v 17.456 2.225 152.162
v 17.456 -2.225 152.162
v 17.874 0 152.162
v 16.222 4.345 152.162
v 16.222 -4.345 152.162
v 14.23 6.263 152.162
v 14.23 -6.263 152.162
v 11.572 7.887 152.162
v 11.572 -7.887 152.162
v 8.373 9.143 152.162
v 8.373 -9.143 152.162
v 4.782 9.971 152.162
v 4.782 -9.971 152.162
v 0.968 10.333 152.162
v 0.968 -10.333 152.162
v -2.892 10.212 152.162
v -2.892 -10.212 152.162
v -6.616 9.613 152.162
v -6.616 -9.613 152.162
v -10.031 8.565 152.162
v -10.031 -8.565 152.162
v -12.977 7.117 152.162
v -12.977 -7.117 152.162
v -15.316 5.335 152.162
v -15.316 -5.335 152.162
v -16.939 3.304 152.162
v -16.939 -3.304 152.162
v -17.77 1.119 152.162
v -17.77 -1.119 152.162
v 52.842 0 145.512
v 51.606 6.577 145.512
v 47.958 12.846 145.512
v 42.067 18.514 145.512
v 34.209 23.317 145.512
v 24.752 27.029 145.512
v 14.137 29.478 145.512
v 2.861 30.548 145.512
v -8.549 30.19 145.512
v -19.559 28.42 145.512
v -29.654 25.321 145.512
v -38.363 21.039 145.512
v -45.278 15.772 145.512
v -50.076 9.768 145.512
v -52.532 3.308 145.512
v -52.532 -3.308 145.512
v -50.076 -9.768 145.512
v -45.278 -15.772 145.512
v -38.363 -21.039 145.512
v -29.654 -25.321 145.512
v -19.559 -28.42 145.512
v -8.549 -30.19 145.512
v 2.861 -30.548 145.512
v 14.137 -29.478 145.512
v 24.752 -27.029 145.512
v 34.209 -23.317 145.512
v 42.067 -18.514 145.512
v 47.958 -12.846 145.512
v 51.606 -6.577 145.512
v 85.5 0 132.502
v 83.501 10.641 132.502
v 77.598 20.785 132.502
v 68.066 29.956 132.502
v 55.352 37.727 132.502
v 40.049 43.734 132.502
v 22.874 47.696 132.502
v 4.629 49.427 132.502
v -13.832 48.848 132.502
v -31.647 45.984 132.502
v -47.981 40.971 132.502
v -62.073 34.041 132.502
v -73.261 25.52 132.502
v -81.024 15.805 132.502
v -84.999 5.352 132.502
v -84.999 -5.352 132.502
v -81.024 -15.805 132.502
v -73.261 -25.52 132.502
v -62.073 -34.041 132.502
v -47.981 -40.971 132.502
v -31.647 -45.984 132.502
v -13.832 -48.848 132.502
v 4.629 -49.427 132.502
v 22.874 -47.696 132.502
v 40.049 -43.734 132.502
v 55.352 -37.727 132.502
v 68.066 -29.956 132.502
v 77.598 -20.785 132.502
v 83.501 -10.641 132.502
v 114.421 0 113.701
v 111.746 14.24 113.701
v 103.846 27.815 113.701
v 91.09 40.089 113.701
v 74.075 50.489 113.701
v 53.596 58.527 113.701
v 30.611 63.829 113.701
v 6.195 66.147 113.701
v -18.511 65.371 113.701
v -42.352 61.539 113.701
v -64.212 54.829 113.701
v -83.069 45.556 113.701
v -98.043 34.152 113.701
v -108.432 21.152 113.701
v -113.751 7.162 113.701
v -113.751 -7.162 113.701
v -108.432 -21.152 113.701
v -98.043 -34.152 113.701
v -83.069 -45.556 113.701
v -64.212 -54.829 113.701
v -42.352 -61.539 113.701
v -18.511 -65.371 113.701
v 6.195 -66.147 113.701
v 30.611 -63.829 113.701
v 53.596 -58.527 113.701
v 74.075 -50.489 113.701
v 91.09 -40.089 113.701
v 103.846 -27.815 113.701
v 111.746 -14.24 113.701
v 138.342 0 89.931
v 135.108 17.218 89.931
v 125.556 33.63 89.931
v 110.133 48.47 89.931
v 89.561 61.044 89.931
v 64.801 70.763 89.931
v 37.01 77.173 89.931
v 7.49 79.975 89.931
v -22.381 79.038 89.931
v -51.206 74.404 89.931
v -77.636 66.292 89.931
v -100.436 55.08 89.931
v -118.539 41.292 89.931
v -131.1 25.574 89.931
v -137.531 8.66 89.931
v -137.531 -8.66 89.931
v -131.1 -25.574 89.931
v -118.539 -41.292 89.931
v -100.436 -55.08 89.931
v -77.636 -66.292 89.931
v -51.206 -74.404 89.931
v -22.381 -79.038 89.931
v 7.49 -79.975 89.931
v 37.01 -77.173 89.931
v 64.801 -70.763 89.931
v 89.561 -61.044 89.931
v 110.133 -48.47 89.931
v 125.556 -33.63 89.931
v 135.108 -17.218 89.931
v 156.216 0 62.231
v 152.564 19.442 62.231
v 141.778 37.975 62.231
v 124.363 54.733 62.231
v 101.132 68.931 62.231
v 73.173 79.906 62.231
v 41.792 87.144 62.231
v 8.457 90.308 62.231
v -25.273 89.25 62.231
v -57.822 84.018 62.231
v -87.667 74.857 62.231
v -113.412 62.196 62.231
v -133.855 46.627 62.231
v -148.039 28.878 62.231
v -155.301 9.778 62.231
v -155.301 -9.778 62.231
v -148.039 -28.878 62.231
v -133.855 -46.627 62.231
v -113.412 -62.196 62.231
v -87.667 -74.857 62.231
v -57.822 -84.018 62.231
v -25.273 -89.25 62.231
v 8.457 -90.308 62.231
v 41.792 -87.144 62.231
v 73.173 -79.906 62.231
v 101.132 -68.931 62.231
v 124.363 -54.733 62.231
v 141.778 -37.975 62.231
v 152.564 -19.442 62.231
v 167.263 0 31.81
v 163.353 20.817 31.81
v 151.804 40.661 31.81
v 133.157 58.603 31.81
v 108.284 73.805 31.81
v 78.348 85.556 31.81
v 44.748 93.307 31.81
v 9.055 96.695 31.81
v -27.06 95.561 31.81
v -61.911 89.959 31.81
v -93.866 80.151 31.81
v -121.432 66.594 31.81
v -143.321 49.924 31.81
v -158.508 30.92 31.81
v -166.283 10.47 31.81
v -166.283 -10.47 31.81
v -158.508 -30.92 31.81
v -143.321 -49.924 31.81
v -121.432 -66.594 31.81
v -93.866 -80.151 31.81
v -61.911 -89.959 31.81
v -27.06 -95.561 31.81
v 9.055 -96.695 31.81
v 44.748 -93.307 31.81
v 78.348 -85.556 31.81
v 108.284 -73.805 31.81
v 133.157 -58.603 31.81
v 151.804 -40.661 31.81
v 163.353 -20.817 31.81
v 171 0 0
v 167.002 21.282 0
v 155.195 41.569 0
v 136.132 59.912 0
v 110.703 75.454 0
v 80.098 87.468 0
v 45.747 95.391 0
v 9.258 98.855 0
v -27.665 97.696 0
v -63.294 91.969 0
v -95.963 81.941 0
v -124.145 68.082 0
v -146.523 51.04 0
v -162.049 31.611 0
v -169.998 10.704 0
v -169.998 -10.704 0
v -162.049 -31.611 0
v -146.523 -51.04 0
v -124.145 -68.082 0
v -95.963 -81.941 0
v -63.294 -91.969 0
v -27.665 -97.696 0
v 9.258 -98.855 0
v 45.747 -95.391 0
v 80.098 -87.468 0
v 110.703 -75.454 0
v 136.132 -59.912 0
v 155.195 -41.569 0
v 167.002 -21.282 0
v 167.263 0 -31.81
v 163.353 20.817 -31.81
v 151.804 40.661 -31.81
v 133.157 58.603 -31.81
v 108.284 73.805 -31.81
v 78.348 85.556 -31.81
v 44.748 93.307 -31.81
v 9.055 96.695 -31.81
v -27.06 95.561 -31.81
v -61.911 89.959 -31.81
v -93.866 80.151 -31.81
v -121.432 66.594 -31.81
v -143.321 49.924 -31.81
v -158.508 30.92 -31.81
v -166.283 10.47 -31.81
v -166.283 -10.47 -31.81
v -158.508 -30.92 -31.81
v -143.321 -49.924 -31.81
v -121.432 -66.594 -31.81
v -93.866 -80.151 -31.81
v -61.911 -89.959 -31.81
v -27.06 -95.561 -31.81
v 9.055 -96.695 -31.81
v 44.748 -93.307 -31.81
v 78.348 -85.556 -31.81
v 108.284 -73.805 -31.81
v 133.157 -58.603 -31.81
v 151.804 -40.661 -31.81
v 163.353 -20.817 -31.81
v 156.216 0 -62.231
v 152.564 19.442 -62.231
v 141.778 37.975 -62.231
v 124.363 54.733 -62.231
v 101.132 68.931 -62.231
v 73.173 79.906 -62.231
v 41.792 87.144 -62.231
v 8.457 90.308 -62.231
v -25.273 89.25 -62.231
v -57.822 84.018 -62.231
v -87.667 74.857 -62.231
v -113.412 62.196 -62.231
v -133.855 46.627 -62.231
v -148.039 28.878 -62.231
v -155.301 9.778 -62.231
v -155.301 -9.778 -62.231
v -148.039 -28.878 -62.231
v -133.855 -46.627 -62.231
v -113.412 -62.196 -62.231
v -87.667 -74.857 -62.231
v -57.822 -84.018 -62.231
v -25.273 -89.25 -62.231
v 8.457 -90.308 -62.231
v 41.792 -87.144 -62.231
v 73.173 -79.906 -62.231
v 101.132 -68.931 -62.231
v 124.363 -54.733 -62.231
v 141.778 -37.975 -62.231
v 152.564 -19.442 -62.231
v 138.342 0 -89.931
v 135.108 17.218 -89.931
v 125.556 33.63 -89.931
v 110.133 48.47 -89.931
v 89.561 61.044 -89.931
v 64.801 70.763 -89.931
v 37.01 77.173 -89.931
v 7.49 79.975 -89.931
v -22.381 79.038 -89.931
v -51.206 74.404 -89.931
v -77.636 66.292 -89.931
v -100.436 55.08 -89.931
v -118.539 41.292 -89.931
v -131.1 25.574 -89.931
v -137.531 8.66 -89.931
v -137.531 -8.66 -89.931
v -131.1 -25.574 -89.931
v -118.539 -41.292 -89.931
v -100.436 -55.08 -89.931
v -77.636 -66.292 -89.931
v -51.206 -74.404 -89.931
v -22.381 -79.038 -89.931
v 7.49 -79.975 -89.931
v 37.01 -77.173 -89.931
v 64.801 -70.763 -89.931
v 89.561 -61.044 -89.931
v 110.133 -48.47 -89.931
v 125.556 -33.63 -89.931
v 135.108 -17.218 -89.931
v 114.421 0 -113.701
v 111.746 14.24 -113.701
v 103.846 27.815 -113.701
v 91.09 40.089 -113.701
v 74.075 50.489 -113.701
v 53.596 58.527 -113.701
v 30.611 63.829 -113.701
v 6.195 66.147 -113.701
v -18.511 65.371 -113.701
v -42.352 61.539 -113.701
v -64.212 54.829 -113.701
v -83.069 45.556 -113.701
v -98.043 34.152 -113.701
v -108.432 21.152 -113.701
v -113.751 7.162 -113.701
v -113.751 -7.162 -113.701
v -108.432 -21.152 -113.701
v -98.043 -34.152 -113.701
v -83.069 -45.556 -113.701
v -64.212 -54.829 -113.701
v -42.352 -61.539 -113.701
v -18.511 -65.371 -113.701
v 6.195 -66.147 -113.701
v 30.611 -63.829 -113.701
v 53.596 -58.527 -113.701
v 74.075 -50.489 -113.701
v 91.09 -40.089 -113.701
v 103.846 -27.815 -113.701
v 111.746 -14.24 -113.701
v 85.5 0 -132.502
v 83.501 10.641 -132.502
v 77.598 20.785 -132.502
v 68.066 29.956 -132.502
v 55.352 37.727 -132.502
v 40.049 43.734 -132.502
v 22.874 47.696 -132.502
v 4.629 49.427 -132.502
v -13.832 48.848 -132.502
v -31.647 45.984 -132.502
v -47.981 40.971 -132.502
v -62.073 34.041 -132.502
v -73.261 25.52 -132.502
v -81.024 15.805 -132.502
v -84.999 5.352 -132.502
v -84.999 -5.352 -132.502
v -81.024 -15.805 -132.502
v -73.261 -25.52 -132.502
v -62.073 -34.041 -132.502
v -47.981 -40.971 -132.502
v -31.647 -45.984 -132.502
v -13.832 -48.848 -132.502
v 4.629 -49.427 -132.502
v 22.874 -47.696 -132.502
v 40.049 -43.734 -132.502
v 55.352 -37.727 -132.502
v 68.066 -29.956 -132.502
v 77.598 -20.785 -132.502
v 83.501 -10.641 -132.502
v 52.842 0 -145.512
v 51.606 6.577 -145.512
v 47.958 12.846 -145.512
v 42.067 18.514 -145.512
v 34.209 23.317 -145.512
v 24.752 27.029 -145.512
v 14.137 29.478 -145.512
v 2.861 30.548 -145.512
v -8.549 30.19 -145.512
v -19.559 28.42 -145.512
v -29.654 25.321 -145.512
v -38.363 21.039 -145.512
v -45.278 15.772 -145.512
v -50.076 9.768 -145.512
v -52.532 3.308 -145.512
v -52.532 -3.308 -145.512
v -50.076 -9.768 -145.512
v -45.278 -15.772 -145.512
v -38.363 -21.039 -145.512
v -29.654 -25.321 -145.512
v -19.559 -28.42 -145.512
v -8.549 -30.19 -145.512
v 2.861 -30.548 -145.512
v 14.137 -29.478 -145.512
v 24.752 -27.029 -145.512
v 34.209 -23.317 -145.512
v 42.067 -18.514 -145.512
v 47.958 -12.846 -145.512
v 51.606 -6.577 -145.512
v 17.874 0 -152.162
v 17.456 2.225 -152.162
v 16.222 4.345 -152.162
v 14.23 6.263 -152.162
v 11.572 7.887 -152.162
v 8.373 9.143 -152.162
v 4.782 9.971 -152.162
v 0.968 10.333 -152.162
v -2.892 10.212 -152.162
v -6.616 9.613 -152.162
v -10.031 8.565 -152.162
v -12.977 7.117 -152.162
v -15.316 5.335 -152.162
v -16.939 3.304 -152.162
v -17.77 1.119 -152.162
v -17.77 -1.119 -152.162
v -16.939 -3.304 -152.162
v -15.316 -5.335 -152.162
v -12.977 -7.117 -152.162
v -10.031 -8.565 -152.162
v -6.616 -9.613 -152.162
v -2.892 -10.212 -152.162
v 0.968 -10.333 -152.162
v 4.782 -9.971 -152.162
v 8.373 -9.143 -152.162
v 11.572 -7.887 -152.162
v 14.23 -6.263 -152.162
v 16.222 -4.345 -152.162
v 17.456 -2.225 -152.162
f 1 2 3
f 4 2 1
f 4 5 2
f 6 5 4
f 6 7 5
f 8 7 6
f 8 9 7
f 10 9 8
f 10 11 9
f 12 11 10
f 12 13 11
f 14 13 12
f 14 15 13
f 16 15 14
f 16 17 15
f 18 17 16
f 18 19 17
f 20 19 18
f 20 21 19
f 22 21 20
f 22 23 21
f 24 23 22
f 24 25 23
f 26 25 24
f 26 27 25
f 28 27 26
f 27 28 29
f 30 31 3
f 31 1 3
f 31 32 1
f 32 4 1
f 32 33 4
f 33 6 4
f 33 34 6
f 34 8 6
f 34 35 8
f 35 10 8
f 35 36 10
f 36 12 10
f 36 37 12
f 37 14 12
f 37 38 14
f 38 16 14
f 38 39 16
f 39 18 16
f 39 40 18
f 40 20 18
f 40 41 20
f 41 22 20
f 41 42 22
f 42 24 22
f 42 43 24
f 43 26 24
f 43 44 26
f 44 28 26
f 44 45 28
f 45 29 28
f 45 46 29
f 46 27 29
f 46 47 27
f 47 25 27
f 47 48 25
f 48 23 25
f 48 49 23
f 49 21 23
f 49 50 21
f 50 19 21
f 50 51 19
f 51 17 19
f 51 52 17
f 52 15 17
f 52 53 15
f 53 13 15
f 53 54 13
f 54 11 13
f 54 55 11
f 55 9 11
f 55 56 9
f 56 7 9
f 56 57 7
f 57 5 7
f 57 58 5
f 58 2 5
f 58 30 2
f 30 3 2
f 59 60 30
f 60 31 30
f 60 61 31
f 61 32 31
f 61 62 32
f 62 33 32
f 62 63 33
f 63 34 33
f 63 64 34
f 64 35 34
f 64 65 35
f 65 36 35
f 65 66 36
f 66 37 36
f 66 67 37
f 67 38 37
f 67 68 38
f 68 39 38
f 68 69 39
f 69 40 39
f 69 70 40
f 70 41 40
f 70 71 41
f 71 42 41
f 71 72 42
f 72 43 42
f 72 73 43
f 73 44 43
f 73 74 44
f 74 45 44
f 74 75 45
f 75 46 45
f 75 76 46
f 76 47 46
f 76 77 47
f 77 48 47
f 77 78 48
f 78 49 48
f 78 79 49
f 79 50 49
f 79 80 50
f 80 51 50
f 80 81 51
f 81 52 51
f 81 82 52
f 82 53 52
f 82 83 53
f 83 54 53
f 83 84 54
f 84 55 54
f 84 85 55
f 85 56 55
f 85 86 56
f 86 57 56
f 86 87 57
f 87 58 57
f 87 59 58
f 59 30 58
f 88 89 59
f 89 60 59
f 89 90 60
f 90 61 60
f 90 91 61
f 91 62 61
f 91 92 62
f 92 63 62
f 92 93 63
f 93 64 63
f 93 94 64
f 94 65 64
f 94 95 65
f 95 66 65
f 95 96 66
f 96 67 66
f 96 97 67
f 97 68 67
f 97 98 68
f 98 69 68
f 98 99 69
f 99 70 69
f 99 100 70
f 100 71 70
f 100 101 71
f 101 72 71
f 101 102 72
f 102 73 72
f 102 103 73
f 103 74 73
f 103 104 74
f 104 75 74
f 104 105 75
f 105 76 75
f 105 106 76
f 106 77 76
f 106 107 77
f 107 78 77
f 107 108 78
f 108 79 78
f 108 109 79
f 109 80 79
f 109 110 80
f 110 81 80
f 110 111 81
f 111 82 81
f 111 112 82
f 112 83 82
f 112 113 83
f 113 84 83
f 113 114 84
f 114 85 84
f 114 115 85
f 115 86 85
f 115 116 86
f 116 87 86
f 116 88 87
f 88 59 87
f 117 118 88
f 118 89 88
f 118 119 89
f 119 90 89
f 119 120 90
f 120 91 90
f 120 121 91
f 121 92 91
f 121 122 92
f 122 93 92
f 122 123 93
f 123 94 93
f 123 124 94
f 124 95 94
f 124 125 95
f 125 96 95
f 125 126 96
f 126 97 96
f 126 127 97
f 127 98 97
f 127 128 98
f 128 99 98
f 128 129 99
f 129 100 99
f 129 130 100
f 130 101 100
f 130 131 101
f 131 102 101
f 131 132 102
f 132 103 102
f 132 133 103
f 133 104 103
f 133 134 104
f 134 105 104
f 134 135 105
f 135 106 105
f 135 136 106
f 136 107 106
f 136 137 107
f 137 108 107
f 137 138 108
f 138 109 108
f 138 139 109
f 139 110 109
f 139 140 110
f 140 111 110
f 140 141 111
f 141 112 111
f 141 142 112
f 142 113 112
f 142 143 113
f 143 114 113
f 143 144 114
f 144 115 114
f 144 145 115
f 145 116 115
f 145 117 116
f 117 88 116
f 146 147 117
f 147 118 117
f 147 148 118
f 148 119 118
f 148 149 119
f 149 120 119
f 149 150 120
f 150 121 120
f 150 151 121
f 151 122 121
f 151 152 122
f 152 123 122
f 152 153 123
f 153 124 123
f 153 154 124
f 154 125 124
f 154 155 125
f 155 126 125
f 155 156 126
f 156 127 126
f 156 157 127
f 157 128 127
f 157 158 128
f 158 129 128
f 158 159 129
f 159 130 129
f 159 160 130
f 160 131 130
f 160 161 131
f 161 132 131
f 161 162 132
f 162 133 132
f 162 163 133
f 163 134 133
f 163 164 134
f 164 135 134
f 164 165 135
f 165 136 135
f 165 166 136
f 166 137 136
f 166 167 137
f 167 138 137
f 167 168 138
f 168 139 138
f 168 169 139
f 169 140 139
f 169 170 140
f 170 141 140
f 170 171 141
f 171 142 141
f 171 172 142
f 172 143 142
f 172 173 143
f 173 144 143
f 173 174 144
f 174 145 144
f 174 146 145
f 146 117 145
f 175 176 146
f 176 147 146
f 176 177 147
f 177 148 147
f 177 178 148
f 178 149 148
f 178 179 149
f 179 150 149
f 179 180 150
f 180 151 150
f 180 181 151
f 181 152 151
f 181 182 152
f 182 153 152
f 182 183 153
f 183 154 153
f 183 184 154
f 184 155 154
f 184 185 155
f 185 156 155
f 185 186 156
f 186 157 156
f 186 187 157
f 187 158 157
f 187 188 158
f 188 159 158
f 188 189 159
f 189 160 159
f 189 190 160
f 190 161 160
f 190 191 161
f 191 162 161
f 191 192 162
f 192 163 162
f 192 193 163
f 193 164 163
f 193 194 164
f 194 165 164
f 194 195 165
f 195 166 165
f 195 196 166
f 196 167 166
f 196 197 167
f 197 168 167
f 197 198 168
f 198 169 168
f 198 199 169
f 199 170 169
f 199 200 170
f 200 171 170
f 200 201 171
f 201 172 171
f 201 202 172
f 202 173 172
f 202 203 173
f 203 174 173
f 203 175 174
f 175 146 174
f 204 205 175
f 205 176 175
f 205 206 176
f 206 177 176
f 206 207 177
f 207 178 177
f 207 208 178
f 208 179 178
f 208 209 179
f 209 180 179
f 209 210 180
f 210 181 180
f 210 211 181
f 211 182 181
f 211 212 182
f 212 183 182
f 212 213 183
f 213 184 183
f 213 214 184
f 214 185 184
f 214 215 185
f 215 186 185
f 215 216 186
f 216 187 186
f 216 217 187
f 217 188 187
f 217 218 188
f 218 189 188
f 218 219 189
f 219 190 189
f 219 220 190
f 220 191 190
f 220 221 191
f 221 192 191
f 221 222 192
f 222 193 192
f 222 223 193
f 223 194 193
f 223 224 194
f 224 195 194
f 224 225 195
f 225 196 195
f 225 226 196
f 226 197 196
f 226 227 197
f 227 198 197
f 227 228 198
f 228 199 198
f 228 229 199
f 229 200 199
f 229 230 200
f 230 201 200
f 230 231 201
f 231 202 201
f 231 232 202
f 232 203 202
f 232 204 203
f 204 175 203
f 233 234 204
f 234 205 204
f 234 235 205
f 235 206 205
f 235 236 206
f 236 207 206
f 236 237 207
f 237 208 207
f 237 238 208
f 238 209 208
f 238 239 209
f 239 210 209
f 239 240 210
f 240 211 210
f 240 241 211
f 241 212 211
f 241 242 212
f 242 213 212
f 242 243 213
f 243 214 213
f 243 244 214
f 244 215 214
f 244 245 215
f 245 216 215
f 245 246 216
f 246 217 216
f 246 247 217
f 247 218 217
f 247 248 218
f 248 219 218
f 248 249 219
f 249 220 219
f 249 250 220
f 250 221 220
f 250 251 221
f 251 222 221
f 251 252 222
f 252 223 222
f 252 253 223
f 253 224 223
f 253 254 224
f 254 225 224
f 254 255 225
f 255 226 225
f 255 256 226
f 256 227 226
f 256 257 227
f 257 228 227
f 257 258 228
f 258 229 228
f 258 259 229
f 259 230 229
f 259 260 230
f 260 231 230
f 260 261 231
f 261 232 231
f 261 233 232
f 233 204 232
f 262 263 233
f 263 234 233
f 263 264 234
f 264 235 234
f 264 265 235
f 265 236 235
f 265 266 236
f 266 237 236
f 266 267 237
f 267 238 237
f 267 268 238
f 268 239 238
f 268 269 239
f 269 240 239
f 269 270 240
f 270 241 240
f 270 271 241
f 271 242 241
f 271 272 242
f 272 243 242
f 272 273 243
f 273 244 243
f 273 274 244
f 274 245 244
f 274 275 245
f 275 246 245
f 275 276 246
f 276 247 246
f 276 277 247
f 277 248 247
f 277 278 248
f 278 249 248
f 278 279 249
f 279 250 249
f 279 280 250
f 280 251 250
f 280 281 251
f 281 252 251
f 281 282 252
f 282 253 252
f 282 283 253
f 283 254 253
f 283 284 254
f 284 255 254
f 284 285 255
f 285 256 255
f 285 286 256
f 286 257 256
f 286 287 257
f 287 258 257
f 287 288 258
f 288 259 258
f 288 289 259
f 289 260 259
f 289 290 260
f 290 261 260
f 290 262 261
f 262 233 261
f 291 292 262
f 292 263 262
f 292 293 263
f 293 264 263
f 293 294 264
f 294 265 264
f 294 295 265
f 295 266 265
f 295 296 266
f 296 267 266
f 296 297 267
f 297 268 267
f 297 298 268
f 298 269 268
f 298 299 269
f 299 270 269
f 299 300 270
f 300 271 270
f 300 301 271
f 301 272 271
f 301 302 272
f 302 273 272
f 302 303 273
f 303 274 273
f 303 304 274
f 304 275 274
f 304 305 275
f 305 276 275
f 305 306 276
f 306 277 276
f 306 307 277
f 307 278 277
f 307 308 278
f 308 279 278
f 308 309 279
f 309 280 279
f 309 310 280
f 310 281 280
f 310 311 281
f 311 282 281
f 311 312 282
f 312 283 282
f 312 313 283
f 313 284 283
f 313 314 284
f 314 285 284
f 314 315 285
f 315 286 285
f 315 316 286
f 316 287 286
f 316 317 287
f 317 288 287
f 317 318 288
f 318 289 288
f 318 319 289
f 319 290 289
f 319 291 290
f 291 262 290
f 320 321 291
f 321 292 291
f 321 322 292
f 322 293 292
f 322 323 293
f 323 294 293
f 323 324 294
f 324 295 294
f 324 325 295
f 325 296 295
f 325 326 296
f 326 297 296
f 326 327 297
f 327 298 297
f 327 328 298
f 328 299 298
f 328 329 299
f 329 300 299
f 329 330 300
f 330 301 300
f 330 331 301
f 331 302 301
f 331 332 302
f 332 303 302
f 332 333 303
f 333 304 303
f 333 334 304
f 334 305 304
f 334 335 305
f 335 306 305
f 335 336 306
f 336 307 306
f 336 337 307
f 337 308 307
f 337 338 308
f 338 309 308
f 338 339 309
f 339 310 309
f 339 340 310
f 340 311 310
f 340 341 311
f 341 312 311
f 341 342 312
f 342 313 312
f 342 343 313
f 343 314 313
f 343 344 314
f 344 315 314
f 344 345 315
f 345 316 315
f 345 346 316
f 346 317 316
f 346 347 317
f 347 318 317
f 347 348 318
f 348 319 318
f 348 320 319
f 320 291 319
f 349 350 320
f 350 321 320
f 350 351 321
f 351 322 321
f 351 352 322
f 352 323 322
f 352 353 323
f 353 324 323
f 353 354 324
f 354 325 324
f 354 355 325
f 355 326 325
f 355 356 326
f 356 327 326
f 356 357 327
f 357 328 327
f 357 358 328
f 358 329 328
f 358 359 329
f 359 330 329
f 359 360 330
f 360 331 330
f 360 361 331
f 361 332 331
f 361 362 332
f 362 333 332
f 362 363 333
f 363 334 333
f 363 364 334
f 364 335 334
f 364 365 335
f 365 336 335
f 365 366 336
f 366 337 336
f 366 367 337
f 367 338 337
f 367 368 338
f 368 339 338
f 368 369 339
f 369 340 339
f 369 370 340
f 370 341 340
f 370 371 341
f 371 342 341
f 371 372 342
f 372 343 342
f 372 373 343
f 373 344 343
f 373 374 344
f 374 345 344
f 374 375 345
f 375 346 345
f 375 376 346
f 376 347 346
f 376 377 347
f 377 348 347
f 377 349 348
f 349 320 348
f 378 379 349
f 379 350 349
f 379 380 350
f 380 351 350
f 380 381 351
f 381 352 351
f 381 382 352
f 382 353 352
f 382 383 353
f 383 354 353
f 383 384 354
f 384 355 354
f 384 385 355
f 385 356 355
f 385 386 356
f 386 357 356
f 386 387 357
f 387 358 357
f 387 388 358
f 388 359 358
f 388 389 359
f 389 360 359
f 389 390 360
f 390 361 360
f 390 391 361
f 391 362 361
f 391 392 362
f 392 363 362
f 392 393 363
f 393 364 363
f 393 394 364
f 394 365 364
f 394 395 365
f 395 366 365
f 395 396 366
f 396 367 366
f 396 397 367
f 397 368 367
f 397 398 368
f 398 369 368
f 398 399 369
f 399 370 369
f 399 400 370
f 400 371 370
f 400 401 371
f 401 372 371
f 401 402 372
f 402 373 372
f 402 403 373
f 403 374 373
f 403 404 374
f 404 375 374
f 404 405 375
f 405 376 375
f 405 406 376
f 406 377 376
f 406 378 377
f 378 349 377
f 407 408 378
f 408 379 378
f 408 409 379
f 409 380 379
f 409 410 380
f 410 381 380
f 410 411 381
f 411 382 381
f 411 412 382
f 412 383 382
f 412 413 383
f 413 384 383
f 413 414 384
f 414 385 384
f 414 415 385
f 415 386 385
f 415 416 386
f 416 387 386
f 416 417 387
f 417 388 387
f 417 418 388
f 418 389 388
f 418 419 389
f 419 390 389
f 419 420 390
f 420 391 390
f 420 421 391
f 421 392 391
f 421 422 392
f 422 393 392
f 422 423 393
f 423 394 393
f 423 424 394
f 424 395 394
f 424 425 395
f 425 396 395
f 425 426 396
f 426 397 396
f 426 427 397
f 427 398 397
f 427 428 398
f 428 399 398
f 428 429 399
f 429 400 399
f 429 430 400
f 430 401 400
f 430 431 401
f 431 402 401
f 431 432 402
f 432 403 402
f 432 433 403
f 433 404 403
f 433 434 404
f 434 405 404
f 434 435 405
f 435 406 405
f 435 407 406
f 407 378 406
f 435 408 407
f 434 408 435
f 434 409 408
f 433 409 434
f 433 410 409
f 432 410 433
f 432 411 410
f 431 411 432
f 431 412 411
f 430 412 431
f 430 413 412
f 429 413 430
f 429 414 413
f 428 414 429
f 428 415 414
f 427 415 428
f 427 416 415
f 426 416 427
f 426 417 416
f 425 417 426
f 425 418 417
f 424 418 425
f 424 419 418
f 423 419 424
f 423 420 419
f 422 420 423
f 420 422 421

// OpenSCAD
// Generated by SolidPython 1.0.1 on 2020-07-29 00:46:54


scale(v = [19, 11, 17]) {
	sphere(r = 9);
}
/***********************************************
*********      SolidPython code:      **********
************************************************
 
# import packages: SolidPython
from solid import *
from solid.utils import *
from itertools import chain, combinations, permutations


class Resize:

    def __init__(self, scad_file):
        self.scad_file = scad_file
        #self.scad_file = import_scad(scad_file)
        # cone/cylinder param:
        self.r1 = 0
        self.r2 = 0
        self.h = 0
        # rectangular prism param:
        self.w = 0
        self.l = 0
        # ellipse param:
        self.r = 0

    # import OpenScad code (file name corresponds to shape)


    # classify shape + parameters
    def assign(self, param1, param2, param3):
        if self.scad_file == 'cone.scad':
            self.r1 = param1
            self.r2 = param2
            self.h = param3
        elif self.scad_file == 'cylinder.scad':
            self.r1 = param1
            self.r2 = param2
            self.h = param3
        elif self.scad_file == 'rectangularPrism.scad':
            self.h = param1
            self.l = param2
            self.w = param3
        else:
            self.r = param1
            self.h = param2

    # resize parameters
    def iterate(self):
        x = range(3, 20, 2)
        i = 1
        if self.scad_file == 'cone.scad':
            tempList = list(permutations(x, 2))
            for temp in tempList:
                param1 = temp[0]
                param2 = temp[1]
                filepath = 'produced_scad_files/' + 'cone' + str(param1) + '_' + str(param2) + '_' + '.scad'
                scad_render_to_file(cylinder(h=param1, r1=param2, r2=0), filepath)

        elif self.scad_file == 'cylinder.scad':
            tempList = list(permutations(x, 3))
            for temp in tempList:
                param1 = temp[0]
                param2 = temp[1]
                filepath = 'produced_scad_files/' + 'cylinder' + str(param1) + '_' + str(param2) + '_' + '.scad'
                scad_render_to_file(cylinder(h=param1, r1=param2, r2=param2), filepath)

        elif self.scad_file == 'rectangularPrism.scad':
            tempList = list(permutations(x, 3))
            for temp in tempList:
                param1 = temp[0]
                param2 = temp[1]
                param3 = temp[2]
                filepath = 'produced_scad_files/' + 'rectangularPrism' + str(param1) + '_' + str(param2) + '_' + str(
                    param3) + '.scad'
                scad_render_to_file(cube(size=(param1, param2, param3)), filepath)

        elif self.scad_file == 'ellipse.scad':
            tempList = list(permutations(x, 4))
            for temp in tempList:
                param1 = temp[0]
                param2 = temp[1]
                param3 = temp[2]
                param4 = temp[3]
                filepath = 'produced_scad_files/' + 'ellipse' + str(param1) + '_' + str(param2) + '_' + str(param3) + '_' + str(param4) + '.scad'
                scad_render_to_file(scale([param1, param2, param3])(sphere(r=param4)), filepath)

    def render_to_scadfile(self):
        scad_render_to_file(scad, 'example.scad') 
 
************************************************/
